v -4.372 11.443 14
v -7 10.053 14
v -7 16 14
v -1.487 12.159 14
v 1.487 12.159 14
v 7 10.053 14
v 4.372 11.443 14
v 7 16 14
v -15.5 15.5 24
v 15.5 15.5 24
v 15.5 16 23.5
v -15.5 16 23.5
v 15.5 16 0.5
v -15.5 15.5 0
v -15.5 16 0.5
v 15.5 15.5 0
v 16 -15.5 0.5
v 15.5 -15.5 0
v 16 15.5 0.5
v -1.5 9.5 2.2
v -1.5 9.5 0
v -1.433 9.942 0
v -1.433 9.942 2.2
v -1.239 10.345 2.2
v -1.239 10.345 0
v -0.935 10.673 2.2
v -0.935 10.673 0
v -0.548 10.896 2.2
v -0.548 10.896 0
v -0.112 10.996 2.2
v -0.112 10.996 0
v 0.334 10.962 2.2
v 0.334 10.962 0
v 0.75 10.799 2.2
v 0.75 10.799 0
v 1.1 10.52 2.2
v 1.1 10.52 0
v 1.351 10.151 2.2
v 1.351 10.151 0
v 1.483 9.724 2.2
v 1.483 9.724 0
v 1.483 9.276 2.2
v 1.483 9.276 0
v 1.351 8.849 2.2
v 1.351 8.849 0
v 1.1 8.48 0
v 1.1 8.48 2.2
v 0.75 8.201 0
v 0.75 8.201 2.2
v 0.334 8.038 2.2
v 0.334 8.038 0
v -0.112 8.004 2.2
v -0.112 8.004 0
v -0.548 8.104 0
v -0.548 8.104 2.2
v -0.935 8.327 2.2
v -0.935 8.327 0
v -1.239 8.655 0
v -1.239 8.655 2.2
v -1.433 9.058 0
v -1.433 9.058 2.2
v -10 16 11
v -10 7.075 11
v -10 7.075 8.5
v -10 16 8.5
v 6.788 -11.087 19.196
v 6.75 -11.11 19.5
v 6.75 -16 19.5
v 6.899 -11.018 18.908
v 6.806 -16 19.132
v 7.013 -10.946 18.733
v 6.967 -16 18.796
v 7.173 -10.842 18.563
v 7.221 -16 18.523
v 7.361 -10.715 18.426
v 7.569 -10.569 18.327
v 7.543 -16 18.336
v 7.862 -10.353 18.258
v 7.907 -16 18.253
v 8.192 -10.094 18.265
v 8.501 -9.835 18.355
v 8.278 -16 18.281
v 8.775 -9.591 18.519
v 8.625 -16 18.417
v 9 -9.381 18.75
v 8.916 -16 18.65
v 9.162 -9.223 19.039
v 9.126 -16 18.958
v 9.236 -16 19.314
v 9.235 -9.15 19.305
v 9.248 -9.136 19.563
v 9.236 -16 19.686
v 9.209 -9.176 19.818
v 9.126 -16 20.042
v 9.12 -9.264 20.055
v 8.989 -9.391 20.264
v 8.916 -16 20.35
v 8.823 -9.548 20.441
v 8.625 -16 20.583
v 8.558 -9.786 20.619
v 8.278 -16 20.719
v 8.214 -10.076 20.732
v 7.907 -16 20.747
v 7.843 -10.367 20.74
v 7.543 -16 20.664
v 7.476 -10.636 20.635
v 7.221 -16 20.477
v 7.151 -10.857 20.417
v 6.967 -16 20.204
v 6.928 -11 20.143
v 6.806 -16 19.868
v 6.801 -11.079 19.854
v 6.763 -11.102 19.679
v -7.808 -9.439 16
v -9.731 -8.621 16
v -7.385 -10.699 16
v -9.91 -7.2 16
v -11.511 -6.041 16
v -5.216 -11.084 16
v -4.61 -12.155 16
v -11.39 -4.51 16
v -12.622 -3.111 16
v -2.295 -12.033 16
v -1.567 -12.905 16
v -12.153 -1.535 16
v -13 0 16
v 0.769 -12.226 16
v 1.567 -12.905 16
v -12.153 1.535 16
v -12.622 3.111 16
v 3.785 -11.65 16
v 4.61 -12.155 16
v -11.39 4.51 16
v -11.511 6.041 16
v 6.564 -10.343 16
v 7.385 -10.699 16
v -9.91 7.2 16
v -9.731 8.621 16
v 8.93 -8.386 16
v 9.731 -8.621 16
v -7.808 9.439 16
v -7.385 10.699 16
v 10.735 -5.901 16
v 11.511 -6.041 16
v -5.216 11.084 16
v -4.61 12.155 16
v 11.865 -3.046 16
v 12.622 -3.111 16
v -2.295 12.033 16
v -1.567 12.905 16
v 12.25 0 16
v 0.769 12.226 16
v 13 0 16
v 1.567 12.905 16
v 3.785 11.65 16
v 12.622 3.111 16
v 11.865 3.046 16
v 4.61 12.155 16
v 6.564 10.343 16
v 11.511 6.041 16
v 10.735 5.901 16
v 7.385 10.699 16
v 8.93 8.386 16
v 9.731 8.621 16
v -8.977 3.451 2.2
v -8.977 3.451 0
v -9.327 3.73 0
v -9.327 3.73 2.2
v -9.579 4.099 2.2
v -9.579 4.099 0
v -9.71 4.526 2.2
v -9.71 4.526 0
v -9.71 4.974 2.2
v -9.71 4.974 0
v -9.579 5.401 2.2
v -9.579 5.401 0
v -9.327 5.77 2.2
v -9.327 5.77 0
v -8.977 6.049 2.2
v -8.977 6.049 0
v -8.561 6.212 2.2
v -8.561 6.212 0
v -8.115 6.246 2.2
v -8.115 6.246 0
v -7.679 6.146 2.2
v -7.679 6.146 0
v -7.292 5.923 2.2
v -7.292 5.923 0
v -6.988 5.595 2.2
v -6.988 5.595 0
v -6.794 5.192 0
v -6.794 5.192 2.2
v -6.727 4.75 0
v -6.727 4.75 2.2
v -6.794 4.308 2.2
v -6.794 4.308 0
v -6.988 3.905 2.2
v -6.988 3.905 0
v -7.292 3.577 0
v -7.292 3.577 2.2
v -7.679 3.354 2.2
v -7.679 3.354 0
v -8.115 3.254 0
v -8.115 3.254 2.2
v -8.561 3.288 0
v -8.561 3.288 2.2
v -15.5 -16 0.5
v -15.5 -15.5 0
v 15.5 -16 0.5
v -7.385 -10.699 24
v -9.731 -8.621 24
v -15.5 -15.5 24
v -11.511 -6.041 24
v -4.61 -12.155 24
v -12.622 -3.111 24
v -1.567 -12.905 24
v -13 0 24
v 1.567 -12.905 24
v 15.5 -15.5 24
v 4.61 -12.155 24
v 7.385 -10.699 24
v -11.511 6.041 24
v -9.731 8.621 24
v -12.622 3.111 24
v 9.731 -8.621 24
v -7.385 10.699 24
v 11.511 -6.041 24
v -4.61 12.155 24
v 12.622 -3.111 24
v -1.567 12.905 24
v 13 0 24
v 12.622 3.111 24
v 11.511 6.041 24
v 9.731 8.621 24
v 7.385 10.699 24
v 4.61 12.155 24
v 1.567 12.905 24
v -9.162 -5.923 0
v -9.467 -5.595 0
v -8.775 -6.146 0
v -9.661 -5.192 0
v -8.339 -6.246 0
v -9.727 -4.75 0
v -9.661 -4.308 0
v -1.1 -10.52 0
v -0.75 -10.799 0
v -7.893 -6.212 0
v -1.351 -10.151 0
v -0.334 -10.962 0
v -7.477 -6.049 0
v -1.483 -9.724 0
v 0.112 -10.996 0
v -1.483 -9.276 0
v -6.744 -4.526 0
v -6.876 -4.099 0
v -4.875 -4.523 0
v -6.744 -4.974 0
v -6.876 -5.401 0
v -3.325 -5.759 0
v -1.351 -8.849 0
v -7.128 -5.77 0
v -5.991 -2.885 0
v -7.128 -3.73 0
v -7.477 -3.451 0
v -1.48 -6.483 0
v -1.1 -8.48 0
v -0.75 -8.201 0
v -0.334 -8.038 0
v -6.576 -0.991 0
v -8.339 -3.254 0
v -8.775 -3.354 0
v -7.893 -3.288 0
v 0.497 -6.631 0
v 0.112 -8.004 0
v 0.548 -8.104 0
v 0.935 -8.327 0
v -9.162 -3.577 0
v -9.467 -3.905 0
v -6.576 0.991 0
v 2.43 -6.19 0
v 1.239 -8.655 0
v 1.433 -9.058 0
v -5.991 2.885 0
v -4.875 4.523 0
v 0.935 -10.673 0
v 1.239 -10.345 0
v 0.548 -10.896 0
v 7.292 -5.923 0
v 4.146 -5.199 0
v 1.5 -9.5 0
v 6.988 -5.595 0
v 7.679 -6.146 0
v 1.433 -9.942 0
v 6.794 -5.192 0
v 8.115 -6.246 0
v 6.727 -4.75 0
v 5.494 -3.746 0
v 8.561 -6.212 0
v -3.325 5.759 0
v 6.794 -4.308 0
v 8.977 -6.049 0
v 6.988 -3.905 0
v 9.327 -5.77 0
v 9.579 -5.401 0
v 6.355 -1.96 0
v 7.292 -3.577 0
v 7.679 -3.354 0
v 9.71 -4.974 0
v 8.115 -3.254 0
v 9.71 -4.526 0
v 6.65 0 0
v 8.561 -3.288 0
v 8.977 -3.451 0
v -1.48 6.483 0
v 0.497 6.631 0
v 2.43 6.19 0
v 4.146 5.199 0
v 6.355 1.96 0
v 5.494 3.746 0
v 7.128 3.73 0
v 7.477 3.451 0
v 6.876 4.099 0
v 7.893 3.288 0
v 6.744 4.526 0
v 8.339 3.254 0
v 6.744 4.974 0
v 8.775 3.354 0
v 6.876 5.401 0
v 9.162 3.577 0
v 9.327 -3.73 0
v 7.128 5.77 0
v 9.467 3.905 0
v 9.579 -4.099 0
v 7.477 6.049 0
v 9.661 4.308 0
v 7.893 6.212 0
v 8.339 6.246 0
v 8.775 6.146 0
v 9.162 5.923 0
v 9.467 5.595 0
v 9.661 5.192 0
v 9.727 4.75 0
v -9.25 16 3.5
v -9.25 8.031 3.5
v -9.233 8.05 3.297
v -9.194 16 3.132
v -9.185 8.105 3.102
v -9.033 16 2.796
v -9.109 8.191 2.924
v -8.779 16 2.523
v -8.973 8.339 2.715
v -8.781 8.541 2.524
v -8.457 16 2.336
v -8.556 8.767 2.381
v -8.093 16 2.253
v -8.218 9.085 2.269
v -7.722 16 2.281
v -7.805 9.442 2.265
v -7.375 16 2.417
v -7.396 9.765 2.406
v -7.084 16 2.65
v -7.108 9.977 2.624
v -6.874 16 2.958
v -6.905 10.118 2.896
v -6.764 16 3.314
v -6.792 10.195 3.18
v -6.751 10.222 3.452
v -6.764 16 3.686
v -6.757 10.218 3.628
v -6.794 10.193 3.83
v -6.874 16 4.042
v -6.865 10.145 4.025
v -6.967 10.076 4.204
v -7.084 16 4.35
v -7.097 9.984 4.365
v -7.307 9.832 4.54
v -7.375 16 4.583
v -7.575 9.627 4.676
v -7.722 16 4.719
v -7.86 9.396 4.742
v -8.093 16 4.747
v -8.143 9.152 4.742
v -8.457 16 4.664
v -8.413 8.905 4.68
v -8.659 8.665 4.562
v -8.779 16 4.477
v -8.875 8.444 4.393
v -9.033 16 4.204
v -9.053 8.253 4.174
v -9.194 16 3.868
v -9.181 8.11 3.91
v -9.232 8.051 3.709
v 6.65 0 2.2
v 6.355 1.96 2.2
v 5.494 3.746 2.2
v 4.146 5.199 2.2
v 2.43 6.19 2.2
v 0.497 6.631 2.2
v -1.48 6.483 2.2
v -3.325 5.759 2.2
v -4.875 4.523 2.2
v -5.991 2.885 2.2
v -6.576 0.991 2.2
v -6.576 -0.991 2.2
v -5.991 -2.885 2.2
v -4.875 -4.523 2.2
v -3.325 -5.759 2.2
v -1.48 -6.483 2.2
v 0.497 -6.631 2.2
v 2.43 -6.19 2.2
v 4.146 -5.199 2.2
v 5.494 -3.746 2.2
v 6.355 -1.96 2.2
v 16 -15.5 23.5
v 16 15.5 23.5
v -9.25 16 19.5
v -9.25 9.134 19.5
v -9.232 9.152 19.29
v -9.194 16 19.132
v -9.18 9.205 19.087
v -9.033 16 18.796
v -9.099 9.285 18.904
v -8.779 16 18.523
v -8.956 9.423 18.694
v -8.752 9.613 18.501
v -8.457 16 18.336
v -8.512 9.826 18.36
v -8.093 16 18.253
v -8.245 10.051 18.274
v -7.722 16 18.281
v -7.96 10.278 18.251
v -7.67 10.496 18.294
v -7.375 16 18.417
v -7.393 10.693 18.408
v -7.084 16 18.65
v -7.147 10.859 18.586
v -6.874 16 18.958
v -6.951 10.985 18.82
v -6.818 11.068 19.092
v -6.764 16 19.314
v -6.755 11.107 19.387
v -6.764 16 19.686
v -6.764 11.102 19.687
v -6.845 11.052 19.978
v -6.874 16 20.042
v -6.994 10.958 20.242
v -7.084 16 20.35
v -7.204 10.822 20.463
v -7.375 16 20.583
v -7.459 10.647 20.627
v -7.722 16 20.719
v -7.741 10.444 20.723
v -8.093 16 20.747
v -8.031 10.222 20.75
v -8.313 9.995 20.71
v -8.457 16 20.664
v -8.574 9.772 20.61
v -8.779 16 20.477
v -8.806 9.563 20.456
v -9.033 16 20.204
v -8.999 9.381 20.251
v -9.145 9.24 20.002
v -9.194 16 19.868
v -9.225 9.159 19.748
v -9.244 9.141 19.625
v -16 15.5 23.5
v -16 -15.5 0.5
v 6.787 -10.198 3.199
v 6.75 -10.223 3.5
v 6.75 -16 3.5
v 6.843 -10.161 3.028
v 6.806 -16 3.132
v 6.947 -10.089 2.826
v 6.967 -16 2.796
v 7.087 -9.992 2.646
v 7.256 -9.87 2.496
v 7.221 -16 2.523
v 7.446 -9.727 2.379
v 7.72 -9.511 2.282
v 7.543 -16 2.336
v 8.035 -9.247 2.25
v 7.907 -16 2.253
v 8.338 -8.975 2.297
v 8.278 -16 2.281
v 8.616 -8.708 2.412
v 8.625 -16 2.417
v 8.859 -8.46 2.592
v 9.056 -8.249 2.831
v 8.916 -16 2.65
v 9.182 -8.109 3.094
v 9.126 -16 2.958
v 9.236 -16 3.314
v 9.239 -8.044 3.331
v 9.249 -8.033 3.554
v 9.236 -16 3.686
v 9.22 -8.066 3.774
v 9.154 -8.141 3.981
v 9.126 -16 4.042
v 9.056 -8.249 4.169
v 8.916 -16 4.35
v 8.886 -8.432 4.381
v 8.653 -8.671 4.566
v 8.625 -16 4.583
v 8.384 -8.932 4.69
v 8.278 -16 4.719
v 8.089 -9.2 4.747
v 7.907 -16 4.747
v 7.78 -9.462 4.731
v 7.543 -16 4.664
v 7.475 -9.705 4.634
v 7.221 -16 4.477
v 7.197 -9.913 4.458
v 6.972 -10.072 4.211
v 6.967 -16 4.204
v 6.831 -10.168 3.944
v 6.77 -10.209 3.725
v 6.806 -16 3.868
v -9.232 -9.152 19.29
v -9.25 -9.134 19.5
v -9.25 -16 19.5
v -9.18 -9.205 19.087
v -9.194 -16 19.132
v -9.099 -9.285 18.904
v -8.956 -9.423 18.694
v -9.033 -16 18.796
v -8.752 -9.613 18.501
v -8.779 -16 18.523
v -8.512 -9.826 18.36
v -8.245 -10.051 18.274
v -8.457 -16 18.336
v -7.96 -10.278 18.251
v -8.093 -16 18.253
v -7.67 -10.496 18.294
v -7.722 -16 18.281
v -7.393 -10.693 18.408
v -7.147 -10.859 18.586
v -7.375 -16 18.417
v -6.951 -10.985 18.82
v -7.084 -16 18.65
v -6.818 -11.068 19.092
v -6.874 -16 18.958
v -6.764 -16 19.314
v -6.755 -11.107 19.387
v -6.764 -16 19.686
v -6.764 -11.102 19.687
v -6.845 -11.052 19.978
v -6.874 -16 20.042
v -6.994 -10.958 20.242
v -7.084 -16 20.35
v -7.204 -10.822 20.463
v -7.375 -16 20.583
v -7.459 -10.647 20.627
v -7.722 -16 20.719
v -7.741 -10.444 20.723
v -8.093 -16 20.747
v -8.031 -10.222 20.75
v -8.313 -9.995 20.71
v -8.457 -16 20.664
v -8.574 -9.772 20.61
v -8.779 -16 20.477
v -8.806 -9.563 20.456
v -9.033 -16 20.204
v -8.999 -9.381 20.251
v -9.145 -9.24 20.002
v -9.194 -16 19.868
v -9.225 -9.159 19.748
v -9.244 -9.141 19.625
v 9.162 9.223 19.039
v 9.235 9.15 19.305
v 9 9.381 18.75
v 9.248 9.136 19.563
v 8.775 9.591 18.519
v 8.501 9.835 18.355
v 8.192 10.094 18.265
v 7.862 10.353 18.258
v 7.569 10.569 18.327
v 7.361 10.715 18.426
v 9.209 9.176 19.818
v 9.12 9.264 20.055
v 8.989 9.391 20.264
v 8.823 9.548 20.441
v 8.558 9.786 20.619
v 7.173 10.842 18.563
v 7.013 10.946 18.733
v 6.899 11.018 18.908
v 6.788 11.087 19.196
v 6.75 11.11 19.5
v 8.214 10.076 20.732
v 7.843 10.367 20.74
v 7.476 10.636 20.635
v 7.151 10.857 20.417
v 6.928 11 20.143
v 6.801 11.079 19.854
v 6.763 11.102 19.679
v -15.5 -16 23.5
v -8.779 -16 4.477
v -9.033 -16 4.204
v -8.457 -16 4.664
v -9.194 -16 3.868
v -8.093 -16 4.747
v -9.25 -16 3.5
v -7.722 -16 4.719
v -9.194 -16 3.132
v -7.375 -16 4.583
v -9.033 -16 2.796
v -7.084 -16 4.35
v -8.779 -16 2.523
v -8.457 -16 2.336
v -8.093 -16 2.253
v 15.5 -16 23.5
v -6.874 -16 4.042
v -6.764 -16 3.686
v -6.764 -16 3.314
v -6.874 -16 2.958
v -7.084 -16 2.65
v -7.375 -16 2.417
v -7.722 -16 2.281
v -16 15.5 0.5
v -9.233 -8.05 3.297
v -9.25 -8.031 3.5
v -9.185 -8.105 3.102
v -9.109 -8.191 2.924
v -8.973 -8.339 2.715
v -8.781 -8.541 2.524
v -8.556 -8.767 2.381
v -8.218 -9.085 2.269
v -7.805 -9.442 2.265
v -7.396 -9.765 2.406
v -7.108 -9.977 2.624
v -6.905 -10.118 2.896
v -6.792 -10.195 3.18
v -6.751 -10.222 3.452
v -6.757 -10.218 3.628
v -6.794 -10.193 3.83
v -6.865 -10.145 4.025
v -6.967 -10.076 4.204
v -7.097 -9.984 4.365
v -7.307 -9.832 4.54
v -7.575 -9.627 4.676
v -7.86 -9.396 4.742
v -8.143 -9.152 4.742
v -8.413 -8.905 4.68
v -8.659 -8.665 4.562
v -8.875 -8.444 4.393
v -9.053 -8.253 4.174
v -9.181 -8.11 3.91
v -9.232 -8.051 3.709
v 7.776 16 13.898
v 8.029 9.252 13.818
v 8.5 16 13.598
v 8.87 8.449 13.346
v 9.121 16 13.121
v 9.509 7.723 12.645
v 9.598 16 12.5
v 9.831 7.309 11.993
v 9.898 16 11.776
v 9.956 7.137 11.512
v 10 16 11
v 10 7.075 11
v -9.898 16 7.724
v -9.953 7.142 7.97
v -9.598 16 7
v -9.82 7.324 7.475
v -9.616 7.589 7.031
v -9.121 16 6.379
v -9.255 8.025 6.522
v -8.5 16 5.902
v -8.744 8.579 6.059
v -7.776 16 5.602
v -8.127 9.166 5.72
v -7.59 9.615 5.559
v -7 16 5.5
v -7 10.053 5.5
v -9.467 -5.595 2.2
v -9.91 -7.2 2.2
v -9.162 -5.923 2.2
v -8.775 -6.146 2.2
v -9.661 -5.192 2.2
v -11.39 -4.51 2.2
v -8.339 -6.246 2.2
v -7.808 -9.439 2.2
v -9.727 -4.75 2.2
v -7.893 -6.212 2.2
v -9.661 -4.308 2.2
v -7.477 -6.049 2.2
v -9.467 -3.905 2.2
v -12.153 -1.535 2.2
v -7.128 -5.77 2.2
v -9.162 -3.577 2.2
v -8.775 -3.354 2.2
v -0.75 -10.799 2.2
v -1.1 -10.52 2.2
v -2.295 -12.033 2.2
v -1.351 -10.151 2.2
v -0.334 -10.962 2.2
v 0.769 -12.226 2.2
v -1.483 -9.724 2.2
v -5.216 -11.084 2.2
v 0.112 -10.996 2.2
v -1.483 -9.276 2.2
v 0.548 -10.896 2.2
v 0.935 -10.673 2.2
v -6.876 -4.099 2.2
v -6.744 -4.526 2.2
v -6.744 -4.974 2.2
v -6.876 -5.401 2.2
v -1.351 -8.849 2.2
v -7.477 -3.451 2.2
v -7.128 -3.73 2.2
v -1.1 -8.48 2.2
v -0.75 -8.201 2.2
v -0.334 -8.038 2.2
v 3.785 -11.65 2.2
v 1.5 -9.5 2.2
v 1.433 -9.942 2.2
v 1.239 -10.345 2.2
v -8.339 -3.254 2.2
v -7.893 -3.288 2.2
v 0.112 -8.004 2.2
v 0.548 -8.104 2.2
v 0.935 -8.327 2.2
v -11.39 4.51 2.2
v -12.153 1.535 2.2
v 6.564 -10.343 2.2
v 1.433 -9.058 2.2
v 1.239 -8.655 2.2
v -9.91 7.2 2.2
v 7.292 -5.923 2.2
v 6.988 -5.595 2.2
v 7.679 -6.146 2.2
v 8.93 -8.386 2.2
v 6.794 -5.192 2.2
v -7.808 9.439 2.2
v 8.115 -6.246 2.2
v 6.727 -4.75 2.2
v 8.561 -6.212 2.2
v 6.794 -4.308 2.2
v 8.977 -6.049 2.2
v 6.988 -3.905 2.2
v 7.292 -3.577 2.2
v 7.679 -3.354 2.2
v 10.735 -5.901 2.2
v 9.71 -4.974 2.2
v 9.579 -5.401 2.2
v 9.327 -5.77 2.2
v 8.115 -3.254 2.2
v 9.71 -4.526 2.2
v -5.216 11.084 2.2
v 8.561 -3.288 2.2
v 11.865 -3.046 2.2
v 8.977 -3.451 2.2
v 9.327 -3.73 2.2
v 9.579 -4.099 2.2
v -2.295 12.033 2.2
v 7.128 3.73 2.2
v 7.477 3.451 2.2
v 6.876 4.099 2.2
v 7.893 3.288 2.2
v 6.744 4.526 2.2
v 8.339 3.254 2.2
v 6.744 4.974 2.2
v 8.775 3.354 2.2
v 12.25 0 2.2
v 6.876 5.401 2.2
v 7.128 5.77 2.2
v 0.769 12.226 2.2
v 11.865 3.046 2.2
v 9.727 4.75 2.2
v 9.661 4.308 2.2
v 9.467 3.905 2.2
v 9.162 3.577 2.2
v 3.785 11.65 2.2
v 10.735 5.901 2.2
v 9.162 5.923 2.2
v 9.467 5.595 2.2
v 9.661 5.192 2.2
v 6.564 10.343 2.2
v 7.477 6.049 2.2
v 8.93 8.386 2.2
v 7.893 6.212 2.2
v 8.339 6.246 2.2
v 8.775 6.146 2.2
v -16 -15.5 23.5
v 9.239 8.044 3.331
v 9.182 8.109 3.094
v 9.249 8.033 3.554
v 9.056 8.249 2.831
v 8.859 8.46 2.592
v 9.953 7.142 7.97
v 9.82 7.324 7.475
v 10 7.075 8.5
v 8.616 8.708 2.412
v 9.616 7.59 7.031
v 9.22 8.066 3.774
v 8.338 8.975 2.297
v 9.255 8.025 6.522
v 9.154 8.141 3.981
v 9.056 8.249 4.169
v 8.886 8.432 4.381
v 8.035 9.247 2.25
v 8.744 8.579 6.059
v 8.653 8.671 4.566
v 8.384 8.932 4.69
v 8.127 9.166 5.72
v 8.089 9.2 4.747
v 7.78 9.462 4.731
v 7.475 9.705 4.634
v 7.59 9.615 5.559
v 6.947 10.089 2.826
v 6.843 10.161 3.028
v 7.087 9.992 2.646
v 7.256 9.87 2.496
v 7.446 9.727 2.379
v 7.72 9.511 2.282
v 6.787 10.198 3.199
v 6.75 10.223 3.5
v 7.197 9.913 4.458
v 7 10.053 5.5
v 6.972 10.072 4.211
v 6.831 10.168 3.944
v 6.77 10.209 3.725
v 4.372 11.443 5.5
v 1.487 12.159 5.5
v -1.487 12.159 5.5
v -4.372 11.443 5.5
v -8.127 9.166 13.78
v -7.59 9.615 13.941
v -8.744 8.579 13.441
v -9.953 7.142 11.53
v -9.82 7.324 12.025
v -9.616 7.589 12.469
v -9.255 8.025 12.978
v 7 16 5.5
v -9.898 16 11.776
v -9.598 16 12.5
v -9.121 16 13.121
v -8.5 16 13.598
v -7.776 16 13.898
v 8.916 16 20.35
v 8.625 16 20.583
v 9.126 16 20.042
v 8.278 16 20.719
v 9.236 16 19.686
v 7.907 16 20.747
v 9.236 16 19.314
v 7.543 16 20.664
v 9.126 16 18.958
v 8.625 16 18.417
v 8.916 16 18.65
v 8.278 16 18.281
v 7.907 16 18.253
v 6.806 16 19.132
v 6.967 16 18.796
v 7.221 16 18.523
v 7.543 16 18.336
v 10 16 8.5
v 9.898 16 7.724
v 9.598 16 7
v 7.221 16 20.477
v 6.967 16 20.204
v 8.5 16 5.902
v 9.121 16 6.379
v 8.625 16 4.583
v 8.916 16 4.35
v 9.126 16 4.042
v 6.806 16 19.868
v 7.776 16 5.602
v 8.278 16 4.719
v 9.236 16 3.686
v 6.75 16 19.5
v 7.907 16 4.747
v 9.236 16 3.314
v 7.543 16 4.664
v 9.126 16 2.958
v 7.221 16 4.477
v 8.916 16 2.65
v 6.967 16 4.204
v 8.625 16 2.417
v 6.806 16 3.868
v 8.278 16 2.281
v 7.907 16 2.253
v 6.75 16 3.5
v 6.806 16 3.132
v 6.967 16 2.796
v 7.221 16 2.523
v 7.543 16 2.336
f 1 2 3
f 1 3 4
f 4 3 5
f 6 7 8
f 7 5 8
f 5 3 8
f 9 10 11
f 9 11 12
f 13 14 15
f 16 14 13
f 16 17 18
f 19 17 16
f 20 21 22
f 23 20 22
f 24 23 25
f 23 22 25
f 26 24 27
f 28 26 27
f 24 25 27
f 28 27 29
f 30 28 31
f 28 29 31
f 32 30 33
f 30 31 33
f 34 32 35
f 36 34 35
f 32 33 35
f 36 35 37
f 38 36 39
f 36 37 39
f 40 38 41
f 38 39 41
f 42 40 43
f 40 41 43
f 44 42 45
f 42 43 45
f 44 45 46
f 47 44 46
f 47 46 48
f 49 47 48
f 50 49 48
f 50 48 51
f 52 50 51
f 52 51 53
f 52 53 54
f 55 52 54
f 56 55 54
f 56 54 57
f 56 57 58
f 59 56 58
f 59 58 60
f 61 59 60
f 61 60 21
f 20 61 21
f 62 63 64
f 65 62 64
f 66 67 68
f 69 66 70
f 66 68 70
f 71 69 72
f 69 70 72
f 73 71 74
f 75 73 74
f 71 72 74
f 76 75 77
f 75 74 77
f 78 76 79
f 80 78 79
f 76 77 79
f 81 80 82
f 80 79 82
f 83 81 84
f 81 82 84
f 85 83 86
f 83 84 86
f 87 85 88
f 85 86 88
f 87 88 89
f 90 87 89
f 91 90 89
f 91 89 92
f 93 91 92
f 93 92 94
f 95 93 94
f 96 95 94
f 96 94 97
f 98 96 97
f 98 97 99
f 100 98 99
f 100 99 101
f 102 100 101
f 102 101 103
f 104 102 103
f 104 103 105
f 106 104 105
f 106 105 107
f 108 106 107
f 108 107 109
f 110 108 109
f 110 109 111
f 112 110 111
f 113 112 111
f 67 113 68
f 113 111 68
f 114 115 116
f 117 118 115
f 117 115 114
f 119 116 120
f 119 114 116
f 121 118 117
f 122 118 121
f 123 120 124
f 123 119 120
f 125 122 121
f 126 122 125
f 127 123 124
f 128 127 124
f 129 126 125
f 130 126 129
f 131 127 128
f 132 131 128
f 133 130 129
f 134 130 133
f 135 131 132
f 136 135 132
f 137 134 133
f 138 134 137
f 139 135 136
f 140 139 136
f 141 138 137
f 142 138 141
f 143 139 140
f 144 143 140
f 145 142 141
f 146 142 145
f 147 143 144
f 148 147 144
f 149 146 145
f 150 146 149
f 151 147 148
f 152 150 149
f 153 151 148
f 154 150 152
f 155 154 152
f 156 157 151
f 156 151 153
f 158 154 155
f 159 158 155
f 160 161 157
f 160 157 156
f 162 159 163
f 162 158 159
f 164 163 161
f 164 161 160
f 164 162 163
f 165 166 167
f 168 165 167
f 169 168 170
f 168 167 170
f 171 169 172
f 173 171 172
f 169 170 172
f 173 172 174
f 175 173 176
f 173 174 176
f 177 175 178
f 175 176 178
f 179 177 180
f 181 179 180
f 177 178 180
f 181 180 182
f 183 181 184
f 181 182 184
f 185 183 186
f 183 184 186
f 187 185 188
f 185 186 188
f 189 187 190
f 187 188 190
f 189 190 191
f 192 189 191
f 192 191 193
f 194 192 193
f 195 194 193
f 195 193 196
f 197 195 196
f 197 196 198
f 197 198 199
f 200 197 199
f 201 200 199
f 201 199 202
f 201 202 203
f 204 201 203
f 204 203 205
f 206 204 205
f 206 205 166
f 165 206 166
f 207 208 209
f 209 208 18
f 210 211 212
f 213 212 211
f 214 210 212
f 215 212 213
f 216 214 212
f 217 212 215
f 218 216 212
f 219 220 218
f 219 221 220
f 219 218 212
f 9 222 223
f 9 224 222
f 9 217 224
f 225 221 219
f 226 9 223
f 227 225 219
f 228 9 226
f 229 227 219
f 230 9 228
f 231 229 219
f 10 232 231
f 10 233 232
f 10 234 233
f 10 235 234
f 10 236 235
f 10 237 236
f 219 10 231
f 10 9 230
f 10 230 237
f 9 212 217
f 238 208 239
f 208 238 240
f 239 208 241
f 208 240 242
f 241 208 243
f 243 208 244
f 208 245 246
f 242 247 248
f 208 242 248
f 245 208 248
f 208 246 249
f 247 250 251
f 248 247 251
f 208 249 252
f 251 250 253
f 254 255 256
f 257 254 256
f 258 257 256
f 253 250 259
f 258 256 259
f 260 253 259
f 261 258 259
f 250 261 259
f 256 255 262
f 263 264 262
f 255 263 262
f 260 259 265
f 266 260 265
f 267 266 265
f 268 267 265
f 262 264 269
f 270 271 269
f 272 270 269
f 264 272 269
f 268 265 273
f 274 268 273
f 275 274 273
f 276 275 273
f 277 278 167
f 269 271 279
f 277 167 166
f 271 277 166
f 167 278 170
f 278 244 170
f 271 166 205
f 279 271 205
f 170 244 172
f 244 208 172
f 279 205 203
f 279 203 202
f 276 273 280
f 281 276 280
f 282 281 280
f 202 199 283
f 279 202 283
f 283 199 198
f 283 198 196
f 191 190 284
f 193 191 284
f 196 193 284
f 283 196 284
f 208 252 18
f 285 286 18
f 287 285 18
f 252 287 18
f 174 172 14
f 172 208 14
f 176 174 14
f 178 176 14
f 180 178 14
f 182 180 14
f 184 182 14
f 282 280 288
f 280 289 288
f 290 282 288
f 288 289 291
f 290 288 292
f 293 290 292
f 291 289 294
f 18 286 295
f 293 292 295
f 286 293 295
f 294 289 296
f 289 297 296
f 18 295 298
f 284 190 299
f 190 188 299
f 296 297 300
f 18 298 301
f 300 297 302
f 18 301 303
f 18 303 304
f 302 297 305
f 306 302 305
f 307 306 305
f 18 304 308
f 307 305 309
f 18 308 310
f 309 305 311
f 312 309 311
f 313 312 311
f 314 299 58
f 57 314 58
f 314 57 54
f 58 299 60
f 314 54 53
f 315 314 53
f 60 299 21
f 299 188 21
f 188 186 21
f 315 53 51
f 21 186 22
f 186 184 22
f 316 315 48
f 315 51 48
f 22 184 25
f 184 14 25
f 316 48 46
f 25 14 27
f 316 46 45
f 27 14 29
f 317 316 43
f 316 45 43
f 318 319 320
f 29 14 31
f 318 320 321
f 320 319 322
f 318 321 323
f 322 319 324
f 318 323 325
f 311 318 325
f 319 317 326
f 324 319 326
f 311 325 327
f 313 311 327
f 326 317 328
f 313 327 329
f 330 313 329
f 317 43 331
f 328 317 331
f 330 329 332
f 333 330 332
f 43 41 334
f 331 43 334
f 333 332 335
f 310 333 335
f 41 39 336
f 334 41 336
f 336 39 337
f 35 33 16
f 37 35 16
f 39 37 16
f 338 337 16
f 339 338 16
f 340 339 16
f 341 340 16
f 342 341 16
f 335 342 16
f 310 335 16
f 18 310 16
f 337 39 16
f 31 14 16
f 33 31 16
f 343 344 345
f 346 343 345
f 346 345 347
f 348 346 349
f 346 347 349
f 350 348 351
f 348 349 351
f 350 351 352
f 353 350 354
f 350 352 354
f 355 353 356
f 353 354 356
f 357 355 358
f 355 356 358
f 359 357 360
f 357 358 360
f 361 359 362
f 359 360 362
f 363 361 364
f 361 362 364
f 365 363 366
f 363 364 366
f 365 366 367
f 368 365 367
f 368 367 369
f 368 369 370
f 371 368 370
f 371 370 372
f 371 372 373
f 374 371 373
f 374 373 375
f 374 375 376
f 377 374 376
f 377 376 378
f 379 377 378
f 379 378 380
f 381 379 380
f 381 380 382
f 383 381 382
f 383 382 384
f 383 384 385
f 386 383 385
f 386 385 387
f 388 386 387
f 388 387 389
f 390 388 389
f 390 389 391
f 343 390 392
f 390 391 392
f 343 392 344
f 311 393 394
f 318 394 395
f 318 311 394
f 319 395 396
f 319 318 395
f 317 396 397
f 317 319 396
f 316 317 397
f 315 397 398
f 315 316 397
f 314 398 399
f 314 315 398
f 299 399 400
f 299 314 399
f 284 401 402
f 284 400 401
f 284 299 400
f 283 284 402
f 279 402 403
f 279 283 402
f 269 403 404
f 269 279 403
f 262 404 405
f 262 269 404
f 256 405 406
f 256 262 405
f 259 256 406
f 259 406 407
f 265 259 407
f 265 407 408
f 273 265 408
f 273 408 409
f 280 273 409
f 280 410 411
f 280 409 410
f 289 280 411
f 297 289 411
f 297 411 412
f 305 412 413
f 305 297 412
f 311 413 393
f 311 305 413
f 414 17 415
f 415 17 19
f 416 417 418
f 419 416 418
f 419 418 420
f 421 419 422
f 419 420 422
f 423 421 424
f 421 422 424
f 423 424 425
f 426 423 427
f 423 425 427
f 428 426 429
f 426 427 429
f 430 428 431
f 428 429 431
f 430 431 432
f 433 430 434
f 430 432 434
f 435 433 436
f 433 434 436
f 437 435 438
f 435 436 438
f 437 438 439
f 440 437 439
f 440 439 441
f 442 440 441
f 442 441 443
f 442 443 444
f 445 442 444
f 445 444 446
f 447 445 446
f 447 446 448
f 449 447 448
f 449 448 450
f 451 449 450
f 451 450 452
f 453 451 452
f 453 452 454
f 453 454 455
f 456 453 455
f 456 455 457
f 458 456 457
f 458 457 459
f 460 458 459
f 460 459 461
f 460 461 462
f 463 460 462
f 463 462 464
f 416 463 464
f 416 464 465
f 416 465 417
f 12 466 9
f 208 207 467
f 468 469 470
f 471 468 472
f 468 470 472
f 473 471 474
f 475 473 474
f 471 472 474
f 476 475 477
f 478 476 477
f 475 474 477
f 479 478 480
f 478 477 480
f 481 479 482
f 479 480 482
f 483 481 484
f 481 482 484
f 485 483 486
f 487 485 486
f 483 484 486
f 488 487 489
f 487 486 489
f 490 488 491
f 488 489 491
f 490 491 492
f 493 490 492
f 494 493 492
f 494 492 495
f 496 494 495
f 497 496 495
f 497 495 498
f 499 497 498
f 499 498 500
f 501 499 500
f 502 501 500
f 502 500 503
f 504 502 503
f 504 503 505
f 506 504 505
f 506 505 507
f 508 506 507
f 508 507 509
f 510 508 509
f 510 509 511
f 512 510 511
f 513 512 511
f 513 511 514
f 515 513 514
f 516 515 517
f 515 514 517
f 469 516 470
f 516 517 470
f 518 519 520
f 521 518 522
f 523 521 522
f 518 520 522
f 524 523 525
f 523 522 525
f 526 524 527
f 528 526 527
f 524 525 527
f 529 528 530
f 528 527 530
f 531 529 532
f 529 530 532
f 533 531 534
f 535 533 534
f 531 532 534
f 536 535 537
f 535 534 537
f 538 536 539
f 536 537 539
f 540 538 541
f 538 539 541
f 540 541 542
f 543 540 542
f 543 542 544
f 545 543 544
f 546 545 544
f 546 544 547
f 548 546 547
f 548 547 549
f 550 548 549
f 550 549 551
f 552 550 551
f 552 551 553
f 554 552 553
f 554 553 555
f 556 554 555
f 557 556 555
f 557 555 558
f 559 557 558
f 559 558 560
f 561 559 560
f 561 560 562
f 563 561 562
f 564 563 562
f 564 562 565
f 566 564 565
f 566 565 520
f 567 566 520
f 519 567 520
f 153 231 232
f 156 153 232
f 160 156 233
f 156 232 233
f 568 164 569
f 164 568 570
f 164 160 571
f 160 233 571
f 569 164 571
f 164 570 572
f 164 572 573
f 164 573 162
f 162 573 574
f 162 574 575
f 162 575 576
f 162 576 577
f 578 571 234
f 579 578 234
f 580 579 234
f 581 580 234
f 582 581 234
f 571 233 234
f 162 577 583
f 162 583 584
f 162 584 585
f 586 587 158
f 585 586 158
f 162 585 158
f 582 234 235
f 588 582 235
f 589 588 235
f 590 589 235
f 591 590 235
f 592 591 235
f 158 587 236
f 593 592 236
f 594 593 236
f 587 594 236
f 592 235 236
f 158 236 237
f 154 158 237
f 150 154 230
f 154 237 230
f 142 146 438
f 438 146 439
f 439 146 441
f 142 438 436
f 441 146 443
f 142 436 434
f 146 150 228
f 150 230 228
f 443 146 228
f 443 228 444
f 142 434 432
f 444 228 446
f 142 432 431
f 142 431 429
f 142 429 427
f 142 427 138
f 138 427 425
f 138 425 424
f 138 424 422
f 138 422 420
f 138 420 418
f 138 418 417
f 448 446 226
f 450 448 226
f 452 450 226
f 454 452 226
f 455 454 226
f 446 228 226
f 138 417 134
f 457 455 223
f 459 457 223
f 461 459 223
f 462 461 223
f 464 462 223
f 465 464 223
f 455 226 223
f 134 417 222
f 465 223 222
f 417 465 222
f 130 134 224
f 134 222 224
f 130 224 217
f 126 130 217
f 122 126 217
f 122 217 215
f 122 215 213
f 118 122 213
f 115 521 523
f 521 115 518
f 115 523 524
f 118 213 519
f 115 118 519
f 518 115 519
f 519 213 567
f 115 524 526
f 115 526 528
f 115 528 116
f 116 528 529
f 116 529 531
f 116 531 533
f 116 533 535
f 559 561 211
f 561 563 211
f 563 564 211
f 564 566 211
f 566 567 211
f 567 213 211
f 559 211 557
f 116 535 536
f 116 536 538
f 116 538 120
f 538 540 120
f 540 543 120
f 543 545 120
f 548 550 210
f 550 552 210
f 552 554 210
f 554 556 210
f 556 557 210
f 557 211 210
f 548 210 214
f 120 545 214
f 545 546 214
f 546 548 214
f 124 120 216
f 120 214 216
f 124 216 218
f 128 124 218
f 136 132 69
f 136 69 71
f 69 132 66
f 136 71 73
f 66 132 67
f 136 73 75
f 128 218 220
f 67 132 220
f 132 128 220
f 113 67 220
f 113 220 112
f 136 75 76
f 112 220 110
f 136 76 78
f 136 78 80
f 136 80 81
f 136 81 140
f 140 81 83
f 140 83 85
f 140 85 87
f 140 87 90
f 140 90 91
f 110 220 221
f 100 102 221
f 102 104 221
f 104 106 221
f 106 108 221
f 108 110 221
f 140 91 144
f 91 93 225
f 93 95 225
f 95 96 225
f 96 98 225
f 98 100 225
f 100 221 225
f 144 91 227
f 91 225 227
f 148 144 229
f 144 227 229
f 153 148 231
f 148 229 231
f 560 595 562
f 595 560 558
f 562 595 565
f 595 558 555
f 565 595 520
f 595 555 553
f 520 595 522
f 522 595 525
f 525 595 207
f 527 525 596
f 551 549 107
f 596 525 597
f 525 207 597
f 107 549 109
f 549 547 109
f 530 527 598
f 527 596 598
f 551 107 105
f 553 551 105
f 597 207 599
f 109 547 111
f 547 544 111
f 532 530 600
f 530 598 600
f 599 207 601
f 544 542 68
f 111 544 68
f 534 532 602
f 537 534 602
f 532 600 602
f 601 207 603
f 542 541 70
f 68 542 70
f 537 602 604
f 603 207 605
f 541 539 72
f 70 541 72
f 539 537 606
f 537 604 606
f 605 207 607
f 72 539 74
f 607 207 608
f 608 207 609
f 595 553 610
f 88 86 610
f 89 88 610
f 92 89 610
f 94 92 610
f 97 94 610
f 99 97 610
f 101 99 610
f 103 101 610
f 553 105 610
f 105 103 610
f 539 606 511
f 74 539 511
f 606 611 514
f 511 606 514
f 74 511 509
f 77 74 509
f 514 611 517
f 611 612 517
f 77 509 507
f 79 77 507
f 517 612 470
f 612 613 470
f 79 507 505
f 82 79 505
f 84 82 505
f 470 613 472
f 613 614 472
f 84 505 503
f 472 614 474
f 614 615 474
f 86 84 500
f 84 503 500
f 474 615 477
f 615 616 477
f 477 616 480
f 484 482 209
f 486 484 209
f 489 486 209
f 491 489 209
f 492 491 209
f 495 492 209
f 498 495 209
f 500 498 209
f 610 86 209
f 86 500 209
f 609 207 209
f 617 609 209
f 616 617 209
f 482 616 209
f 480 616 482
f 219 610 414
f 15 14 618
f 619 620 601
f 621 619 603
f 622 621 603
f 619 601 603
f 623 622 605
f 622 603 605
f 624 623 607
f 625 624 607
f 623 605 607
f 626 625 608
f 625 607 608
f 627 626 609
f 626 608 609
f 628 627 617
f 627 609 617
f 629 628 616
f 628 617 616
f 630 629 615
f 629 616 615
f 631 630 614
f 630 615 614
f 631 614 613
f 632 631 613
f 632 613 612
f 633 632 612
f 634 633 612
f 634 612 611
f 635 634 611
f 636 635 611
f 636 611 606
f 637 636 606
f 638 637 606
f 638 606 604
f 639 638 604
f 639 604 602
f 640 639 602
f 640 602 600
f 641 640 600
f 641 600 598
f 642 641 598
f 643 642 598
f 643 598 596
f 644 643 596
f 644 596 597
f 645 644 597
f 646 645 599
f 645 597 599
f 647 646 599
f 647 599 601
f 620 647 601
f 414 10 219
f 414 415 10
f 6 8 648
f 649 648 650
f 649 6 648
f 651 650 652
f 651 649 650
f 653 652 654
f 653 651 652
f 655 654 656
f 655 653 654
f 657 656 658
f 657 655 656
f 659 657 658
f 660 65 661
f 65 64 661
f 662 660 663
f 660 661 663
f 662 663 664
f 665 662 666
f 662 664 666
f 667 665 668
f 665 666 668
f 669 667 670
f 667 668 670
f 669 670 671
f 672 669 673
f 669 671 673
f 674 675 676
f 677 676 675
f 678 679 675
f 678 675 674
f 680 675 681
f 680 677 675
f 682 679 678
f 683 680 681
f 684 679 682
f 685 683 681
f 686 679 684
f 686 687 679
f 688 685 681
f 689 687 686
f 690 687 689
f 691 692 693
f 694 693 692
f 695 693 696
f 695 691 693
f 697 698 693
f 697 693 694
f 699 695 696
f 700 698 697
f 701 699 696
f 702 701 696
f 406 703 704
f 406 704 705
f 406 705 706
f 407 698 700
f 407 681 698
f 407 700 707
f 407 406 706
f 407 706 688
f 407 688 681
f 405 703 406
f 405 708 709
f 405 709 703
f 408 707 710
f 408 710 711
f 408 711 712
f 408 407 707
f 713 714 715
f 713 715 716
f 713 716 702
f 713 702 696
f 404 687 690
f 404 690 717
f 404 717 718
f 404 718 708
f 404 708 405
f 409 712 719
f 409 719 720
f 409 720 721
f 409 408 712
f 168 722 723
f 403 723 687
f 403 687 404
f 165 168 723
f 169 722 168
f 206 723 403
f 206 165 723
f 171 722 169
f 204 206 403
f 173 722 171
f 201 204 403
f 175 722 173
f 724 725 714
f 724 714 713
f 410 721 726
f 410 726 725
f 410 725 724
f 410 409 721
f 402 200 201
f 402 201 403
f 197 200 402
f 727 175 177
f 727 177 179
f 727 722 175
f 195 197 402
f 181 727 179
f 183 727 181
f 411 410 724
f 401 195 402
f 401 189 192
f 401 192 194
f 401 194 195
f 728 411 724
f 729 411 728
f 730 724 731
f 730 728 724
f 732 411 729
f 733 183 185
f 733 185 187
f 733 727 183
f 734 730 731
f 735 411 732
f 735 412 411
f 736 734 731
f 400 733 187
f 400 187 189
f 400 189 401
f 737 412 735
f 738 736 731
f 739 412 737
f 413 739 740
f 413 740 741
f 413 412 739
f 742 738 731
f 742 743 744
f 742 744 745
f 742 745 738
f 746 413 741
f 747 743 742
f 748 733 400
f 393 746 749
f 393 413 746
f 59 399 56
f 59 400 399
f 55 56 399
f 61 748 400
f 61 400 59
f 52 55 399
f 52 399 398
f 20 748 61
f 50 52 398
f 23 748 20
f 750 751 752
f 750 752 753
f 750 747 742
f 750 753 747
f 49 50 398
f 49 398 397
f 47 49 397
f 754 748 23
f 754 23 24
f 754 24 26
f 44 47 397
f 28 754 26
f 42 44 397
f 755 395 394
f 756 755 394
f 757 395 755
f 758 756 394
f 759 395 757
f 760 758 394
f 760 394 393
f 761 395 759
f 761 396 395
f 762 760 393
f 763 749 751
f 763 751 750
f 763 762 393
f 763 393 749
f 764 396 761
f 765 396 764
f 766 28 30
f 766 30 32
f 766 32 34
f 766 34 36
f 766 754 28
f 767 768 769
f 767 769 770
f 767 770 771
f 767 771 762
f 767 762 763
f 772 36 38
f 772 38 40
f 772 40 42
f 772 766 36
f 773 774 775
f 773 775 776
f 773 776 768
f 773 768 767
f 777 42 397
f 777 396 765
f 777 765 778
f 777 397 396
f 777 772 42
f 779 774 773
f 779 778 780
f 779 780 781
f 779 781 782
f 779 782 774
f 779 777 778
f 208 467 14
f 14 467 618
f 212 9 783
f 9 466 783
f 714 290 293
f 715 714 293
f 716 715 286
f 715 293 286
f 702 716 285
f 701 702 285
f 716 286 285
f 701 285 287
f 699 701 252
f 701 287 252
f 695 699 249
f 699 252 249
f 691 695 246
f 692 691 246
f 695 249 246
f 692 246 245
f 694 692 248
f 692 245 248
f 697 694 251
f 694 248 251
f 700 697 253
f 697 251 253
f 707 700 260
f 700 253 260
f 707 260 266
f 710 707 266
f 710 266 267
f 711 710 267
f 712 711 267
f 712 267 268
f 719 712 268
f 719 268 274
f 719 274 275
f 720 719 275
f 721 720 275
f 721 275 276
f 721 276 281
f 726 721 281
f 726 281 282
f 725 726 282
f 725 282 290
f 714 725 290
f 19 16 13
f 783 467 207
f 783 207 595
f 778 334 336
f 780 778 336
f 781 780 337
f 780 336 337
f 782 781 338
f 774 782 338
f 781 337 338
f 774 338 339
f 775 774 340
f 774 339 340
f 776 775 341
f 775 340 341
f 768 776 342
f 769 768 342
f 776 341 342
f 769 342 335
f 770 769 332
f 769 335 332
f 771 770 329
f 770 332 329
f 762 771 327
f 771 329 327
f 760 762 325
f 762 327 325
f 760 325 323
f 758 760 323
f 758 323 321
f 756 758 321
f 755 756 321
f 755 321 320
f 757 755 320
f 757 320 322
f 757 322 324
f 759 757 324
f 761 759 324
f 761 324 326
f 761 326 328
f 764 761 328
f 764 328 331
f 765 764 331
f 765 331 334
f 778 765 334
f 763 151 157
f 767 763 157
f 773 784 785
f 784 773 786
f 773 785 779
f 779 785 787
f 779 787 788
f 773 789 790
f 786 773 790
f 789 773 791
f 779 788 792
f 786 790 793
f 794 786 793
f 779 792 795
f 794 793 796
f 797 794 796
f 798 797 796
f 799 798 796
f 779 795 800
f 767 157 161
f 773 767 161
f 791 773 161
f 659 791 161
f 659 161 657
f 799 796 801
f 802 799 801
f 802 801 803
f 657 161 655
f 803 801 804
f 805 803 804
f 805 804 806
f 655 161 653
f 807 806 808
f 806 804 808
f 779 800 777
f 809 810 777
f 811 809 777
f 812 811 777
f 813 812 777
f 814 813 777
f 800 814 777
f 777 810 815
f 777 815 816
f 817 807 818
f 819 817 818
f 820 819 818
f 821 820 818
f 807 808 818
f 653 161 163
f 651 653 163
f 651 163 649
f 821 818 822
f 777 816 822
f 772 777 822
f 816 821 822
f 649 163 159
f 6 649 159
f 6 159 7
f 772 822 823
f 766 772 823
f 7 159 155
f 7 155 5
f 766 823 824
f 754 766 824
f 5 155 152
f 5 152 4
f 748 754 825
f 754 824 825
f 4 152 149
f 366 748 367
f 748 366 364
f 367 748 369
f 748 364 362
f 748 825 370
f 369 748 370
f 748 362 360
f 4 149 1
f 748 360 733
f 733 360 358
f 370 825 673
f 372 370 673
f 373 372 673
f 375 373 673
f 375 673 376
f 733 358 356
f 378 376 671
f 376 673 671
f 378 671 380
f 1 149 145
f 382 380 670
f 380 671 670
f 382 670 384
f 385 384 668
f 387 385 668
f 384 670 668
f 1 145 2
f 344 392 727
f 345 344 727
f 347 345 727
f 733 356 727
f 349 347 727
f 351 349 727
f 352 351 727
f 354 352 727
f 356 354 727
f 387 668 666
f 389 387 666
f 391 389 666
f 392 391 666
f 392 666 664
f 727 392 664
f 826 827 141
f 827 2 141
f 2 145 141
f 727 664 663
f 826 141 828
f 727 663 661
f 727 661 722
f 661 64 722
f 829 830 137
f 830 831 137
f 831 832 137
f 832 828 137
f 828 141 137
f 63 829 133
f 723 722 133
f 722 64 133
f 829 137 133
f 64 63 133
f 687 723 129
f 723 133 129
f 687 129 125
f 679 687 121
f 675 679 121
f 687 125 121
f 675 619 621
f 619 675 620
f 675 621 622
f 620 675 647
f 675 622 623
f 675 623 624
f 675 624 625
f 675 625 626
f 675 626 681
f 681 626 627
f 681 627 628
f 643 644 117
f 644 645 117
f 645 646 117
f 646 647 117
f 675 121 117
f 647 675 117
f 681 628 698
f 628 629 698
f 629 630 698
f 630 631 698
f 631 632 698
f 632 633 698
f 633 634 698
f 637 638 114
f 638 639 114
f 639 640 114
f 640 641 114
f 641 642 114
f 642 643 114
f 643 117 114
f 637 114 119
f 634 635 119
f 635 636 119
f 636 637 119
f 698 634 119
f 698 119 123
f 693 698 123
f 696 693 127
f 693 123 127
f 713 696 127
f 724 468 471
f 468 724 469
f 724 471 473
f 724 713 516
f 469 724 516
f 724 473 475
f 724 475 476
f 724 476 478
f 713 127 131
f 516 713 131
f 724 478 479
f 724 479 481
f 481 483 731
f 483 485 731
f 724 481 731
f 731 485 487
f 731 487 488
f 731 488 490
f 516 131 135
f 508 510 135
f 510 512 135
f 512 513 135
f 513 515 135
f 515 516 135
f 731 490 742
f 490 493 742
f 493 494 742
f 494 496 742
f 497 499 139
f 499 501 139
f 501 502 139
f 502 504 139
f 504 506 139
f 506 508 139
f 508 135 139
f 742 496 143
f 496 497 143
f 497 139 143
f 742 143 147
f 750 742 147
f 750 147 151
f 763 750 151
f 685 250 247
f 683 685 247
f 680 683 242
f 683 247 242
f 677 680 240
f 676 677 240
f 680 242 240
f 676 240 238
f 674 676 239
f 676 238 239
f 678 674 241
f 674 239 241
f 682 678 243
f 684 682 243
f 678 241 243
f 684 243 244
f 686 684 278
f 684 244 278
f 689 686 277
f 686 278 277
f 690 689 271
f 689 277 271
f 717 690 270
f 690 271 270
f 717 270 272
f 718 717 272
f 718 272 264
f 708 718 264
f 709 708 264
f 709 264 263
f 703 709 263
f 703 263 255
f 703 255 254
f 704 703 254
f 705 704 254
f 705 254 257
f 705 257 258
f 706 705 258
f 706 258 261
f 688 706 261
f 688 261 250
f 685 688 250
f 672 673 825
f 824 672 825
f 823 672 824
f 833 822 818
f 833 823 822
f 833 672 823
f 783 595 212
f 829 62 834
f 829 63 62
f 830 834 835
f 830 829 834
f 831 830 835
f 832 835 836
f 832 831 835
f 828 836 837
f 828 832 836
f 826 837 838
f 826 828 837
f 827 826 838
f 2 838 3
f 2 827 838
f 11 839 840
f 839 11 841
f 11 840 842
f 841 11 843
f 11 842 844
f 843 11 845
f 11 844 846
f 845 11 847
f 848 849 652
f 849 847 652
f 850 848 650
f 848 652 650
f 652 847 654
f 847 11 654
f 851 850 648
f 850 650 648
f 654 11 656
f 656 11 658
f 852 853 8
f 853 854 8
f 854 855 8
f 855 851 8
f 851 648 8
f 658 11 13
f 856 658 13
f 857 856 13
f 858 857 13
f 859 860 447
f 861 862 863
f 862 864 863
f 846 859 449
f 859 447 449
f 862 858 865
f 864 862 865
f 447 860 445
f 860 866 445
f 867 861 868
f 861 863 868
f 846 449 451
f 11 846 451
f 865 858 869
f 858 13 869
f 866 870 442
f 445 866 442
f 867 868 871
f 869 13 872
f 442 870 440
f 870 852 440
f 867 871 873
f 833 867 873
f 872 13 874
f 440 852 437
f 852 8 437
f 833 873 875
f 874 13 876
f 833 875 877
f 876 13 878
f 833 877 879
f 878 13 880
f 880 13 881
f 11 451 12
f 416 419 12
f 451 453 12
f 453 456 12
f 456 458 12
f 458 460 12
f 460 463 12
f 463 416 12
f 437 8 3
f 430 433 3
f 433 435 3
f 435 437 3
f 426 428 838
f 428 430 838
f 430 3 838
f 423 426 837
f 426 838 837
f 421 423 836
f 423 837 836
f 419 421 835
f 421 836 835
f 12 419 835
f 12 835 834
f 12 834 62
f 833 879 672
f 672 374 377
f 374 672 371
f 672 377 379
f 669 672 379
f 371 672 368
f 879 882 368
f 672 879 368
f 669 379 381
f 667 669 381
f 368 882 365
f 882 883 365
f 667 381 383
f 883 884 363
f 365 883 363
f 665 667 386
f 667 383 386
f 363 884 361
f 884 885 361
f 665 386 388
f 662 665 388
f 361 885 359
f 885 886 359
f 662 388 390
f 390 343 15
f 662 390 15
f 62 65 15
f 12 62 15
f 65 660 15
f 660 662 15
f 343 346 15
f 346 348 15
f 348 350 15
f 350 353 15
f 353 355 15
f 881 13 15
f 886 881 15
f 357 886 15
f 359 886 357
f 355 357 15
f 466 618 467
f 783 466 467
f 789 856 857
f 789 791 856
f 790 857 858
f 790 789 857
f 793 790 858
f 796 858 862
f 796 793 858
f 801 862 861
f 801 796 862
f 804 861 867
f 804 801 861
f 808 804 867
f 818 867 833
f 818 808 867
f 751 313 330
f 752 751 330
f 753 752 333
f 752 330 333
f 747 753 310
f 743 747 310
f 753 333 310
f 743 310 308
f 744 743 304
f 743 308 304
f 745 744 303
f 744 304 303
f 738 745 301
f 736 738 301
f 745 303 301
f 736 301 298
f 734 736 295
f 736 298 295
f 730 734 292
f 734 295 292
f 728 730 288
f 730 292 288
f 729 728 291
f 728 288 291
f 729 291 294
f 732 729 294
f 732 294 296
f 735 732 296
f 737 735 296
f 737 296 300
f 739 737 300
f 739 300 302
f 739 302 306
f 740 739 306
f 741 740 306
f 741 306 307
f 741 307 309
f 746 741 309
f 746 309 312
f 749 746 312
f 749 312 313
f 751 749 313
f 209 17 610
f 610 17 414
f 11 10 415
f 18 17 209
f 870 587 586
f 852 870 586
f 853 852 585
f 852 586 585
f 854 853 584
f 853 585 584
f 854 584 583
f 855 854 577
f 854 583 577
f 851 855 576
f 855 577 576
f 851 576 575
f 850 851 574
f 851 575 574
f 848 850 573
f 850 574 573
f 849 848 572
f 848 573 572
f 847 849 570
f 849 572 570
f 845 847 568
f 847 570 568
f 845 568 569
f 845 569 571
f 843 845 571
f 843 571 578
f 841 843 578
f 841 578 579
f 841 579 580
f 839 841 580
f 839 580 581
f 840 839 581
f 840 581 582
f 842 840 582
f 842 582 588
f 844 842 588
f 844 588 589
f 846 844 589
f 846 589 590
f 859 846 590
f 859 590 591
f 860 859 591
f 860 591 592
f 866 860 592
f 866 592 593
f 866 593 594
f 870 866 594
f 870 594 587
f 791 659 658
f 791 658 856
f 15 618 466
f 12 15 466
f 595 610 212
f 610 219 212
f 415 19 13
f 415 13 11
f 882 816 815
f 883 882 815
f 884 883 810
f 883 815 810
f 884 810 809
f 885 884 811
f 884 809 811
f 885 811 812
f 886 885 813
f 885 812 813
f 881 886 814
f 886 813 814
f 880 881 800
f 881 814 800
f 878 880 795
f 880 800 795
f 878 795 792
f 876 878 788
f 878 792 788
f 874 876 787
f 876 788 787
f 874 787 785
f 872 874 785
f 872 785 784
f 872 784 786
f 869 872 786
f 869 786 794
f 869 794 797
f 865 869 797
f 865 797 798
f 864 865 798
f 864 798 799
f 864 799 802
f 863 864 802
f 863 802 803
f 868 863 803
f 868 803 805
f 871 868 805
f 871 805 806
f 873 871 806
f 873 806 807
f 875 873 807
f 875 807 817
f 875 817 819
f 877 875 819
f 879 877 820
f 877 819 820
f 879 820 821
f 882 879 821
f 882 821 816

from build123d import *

# Parameters (mm, degrees)
SKETCH_1_R               = 16
SKETCH_1_R_2             = 6.65
EXTRUDE_1_DEPTH          = 24
SKETCH_3_R               = 1.5
CUT_EXTRUDE_2_DEPTH      = 33.984845005
PATTERN_CIRCULAR_1_COUNT = 6
EXTRUDE_START            = -24
EXTRUDE_2_DEPTH          = 24
SKETCH_7_R               = 13
CUT_EXTRUDE_3_DEPTH      = 21.8
EXTRUDE_START_2          = 13.8
SKETCH_15_R              = 13
SKETCH_15_R_2            = 12.25
EXTRUDE_4_DEPTH          = 13.8
SKETCH_11_W              = 20
SKETCH_11_H              = 8.5
CUT_EXTRUDE_4_DEPTH      = 10
FILLET_1_R               = 3
SKETCH_12_R              = 1
CUT_EXTRUDE_5_DEPTH      = 44.081318457
HOLE_WIZARD_M3_1_D       = 2.5
CHAMFER_1_SIZE           = 0.5


with BuildPart() as part:
    # 草图1 → 凸台-拉伸1 (new body)
    with BuildSketch(Plane.XY):
        Circle(SKETCH_1_R)
        Circle(SKETCH_1_R_2, mode=Mode.SUBTRACT)
    extrude(amount=EXTRUDE_1_DEPTH)

    # 草图3 → 切除-拉伸2 (cut, through all)
    with BuildSketch(Plane(origin=(0, 0, 0), x_dir=(-1, 0, 0), z_dir=(0, 0, -1))):
        with Locations((0, 9.5)):
            Circle(SKETCH_3_R)
    cut_extrude_2 = extrude(amount=-CUT_EXTRUDE_2_DEPTH, mode=Mode.SUBTRACT)

    # 阵列(圆周)1: 切除-拉伸2 ×6 about axis
    pattern_circular_1_axis = Axis((0, 0, 0), (0, 0, 1))
    for i in range(1, PATTERN_CIRCULAR_1_COUNT):
        add(cut_extrude_2.rotate(pattern_circular_1_axis, i * 360 / PATTERN_CIRCULAR_1_COUNT), mode=Mode.SUBTRACT)

    # 草图4 → 凸台-拉伸2 (add)
    with BuildSketch(Plane.XY.offset(24).offset(EXTRUDE_START)):
        with BuildLine():
            ThreePointArc((16, 0), (11.313708518, -11.31370848), (5.5e-08, -16))
            Line((5.5e-08, -16), (16, -16))
            Line((16, -16), (16, 0))
        make_face()
        with BuildLine():
            ThreePointArc((5.5e-08, -16), (-11.31370848, -11.313708518), (-16, 0))
            Line((-16, 0), (-16, -16))
            Line((-16, -16), (5.5e-08, -16))
        make_face()
        with BuildLine():
            Line((-16, 16), (-16, 0))
            ThreePointArc((-16, 0), (-11.313708518, 11.31370848), (-5.5e-08, 16))
            Line((-5.5e-08, 16), (-16, 16))
        make_face()
        with BuildLine():
            Line((16, 16), (-5.5e-08, 16))
            ThreePointArc((-5.5e-08, 16), (11.31370848, 11.313708518), (16, 0))
            Line((16, 0), (16, 16))
        make_face()
    extrude(amount=EXTRUDE_2_DEPTH)

    # 草图7 → 切除-拉伸3 (cut)
    with BuildSketch(Plane.XY.offset(24)):
        Circle(SKETCH_7_R)
    extrude(amount=-CUT_EXTRUDE_3_DEPTH, mode=Mode.SUBTRACT)

    # 草图15 → 凸台-拉伸4 (add)
    with BuildSketch(Plane.XY.offset(2.2).offset(EXTRUDE_START_2)):
        Circle(SKETCH_15_R)
        Circle(SKETCH_15_R_2, mode=Mode.SUBTRACT)
    extrude(amount=-EXTRUDE_4_DEPTH)

    # 草图11 → 切除-拉伸4 (cut)
    with BuildSketch(Plane(origin=(0, 16, 0), x_dir=(1, 0, 0), z_dir=(0, 1, 0))):
        with Locations((0, -9.75)):
            Rectangle(SKETCH_11_W, SKETCH_11_H)
    extrude(amount=-CUT_EXTRUDE_4_DEPTH, mode=Mode.SUBTRACT)

    # 圆角1
    fillet_1_edges = [part.edges().sort_by_distance(p)[0] for p in [
        (10, 11.537742925, 5.5),
        (10, 11.537742925, 14),
        (-10, 11.537742925, 14),
        (-10, 11.537742925, 5.5),
    ]]
    fillet(fillet_1_edges, radius=FILLET_1_R)

    # 草图12 → 切除-拉伸5 (cut, through all)
    with BuildSketch(Plane(origin=(0, 16, 0), x_dir=(1, 0, 0), z_dir=(0, 1, 0))):
        with Locations(Location((8, -3.5, 0), (0, 0, 180))):
            Circle(SKETCH_12_R)
        with Locations(Location((8, -19.5, 0), (0, 0, 180))):
            Circle(SKETCH_12_R)
        with Locations(Location((-8, -3.5, 0), (0, 0, 180))):
            Circle(SKETCH_12_R)
        with Locations(Location((-8, -19.5, 0), (0, 0, 180))):
            Circle(SKETCH_12_R)
    extrude(amount=-CUT_EXTRUDE_5_DEPTH, mode=Mode.SUBTRACT)

    # M3 螺纹孔1 (through all)
    with Locations(Plane(origin=(0, 16, 0), x_dir=(1, 0, 0), z_dir=(0, 1, 0))):
        with Locations((8, -3.5), (-8, -3.5), (-8, -19.5), (8, -19.5)):
            Hole(HOLE_WIZARD_M3_1_D / 2)

    # 倒角1
    chamfer_1_edges = [part.edges().sort_by_distance(p)[0] for p in [
        (0, -16, 24),
        (16, -16, 12),
        (16, 0, 0),
        (16, 0, 24),
        (0, -16, 0),
        (-16, -16, 12),
        (-16, 0, 24),
        (-16, 0, 0),
        (0, 16, 0),
        (-16, 16, 12),
        (0, 16, 24),
        (16, 16, 12),
    ]]
    chamfer(chamfer_1_edges, length=CHAMFER_1_SIZE)


solid = part.part
